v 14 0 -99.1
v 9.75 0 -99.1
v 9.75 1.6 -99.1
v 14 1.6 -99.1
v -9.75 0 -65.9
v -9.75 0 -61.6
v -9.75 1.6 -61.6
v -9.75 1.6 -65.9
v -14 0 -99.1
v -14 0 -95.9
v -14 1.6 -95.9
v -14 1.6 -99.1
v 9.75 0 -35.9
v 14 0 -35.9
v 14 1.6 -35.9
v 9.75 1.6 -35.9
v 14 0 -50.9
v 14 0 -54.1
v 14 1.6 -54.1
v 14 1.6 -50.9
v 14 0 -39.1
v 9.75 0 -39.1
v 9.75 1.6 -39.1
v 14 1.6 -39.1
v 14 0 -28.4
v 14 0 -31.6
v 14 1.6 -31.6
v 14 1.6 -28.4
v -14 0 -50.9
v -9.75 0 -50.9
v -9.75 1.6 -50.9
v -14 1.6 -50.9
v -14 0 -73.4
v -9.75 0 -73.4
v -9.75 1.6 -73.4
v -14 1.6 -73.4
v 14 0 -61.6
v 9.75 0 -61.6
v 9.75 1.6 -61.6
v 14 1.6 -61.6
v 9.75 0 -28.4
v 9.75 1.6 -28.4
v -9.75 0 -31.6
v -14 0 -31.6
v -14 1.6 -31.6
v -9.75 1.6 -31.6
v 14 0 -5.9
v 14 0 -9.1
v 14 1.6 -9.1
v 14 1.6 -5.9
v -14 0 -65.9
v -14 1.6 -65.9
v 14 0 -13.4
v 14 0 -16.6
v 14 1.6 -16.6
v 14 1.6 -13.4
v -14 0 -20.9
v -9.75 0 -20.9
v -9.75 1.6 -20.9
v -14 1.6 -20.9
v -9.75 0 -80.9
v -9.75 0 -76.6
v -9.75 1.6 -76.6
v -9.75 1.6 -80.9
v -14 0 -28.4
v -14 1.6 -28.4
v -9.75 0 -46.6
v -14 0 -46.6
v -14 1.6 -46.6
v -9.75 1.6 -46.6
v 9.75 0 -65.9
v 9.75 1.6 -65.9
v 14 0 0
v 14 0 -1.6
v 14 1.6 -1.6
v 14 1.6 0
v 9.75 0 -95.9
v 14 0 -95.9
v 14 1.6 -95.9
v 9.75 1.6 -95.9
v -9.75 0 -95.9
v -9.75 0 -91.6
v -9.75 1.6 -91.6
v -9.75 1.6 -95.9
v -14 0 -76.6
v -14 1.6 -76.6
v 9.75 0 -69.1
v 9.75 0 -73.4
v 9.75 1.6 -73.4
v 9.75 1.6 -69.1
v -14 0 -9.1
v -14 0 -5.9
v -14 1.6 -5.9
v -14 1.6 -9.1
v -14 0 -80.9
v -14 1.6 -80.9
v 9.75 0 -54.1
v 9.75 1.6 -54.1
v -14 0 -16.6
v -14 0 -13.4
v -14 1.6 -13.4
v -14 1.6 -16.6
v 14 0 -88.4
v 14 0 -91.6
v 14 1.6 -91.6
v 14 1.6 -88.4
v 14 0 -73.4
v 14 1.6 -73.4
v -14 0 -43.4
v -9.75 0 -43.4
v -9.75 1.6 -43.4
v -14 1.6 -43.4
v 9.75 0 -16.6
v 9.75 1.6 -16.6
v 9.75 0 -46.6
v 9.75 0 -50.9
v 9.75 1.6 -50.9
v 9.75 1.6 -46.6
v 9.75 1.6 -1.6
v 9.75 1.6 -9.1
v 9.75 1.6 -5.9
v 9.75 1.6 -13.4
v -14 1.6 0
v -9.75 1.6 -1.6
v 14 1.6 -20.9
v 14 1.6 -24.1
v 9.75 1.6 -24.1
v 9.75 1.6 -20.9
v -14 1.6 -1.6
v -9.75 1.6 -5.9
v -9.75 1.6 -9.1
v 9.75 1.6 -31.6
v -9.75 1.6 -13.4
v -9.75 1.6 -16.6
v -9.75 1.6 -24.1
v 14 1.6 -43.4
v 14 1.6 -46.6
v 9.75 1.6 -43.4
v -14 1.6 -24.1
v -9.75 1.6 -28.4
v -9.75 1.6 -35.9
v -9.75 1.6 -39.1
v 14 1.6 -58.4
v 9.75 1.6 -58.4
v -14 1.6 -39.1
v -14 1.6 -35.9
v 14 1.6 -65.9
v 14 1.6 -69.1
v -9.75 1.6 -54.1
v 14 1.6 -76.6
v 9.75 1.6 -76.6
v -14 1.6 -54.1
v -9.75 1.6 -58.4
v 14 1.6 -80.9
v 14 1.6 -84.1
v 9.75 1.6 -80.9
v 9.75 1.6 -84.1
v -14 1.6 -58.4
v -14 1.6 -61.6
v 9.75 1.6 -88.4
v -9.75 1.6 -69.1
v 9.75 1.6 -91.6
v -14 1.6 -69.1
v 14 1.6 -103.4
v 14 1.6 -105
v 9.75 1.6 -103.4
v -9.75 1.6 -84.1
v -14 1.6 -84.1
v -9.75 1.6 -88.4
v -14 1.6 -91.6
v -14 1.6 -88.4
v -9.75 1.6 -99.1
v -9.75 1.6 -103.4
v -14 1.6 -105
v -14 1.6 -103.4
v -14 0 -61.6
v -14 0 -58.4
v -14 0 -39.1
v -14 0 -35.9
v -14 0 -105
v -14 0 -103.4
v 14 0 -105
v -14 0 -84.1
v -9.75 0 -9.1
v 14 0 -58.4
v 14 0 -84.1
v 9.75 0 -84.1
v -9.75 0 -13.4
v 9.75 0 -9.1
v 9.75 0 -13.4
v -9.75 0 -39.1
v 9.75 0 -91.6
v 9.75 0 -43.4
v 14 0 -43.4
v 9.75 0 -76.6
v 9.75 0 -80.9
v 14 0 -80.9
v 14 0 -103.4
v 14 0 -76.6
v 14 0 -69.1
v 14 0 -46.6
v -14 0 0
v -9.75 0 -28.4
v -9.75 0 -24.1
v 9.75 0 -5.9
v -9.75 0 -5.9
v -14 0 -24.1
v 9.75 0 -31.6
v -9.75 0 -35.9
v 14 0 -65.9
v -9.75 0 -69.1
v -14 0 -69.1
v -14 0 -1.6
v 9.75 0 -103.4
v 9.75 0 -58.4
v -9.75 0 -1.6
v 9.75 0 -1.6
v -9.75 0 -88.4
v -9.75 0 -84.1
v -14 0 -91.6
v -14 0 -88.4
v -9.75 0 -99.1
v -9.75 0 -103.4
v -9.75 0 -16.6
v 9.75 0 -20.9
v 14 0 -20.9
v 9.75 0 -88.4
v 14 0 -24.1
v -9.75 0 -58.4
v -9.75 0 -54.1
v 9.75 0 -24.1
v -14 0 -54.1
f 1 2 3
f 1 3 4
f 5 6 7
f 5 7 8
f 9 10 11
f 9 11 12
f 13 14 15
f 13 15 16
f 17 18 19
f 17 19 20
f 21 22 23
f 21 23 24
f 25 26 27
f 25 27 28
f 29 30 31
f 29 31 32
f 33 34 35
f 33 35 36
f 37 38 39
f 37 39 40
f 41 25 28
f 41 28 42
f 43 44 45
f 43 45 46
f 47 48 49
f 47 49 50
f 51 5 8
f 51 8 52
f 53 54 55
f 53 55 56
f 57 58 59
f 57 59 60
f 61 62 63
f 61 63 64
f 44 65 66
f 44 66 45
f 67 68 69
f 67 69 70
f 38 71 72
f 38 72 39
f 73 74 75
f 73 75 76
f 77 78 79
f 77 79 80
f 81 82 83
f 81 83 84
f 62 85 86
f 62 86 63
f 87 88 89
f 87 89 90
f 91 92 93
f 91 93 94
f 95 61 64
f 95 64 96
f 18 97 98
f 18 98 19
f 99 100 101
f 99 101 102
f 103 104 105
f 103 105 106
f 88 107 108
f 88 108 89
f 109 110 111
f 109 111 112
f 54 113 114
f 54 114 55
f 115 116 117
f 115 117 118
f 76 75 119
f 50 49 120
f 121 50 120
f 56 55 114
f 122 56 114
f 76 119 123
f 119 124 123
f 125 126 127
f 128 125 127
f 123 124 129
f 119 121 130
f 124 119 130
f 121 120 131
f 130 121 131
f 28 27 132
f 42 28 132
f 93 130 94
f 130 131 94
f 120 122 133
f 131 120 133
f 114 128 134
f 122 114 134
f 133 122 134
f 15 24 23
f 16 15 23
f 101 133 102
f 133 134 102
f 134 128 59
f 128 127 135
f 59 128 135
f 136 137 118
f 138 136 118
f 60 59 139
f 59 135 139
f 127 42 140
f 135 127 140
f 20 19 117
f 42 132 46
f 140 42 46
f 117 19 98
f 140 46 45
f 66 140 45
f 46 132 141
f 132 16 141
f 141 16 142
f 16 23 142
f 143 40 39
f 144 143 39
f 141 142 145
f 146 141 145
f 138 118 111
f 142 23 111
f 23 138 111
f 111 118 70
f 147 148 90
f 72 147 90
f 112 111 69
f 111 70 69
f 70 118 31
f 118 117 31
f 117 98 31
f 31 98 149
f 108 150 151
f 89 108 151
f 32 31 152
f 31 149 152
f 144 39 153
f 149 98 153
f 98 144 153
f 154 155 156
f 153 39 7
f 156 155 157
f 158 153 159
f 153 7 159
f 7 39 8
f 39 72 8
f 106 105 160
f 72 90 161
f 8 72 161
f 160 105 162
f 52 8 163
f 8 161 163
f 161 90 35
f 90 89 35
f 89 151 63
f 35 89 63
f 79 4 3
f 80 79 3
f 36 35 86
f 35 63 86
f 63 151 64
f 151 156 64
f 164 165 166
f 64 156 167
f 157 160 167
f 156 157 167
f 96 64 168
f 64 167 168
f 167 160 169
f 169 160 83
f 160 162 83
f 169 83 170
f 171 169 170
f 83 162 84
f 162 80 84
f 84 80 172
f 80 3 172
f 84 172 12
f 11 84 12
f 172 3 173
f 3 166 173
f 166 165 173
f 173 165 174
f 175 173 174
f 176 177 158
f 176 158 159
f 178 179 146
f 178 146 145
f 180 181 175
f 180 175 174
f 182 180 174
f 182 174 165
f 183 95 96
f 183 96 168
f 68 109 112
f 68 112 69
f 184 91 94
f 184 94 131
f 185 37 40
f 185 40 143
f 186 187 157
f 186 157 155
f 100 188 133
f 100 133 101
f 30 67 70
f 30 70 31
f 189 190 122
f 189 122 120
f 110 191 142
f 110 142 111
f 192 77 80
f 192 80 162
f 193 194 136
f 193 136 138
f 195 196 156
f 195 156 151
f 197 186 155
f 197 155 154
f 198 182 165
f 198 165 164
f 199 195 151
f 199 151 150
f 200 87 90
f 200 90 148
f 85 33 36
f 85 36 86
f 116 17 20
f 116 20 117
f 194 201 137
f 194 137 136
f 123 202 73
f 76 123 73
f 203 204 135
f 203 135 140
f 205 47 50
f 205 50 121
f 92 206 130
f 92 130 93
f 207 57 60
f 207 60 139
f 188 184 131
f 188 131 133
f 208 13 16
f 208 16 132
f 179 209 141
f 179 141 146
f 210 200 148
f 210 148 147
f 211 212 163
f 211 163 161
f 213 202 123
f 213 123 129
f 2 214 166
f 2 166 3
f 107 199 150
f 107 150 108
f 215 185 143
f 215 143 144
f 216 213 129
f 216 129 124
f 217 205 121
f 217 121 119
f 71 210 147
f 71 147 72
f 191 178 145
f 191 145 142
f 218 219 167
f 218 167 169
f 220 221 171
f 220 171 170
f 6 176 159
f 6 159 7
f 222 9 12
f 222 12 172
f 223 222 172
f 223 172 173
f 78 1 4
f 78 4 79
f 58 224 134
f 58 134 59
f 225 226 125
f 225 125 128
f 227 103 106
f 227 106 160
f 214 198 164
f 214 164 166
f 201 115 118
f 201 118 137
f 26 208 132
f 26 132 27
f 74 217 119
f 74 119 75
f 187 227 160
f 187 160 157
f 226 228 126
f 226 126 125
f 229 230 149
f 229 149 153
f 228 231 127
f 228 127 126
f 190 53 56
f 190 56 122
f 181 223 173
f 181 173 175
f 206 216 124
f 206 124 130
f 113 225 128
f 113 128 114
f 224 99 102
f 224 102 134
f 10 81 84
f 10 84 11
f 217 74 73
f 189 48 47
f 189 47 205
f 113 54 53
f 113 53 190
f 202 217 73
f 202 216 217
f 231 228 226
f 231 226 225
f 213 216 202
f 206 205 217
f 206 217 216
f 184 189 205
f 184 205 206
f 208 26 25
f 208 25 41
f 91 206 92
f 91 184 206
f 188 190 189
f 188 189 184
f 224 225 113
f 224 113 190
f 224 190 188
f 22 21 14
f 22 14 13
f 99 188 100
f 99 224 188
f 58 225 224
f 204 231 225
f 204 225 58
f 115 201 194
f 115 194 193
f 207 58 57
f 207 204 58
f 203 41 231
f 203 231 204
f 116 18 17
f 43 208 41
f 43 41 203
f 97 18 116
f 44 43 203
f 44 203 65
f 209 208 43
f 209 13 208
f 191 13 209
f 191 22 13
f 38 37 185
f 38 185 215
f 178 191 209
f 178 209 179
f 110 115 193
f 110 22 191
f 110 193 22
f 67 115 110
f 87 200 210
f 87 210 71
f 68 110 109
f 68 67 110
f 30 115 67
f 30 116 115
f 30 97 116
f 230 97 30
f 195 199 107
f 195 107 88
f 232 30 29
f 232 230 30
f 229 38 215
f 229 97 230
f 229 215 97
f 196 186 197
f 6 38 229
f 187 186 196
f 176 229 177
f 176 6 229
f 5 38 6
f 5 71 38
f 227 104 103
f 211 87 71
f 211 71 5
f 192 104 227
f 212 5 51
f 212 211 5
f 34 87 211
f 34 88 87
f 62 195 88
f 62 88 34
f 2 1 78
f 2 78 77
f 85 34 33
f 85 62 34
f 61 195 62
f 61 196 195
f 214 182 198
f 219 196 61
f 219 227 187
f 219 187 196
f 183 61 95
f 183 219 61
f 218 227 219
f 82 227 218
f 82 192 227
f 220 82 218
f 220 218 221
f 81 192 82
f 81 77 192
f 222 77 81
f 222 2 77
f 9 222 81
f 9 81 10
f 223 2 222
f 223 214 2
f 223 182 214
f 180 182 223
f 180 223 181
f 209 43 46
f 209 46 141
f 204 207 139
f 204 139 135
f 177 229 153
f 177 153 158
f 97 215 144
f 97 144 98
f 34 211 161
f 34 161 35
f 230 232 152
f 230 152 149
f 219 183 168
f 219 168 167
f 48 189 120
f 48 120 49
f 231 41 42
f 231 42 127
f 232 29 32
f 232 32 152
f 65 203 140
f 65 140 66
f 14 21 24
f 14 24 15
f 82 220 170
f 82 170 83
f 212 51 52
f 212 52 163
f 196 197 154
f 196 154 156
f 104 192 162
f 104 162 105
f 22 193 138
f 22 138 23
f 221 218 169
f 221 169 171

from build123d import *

# Parameters (mm, degrees)
BOSS_EXTRUDE1_DEPTH     = 1.6
CUT_EXTRUDE1_DEPTH      = 108.527298859
CUT_EXTRUDE1_DEPTH_BACK = 108.527298859
SKETCH2_OUTSIDE_W       = 52.356
SKETCH2_OUTSIDE_H       = 132.556
SKETCH2_OUTSIDE_W_2     = 49.825582729
SKETCH2_OUTSIDE_H_2     = 105


with BuildPart() as part:
    # Sketch1 → Boss-Extrude1 (new body)
    with BuildSketch(Plane(origin=(0, 0, 0), x_dir=(1, 0, 0), z_dir=(0, 1, 0))):
        Polygon((14, -1.6), (-14, -1.6), (-14, 1.6), (-9.75, 1.6), (-9.75, 5.9), (-14, 5.9), (-14, 9.1), (-9.75, 9.1), (-9.75, 13.4), (-14, 13.4), (-14, 16.6), (-9.75, 16.6), (-9.75, 20.9), (-14, 20.9), (-14, 24.1), (-9.75, 24.1), (-9.75, 28.4), (-14, 28.4), (-14, 31.6), (-9.75, 31.6), (-9.75, 35.9), (-14, 35.9), (-14, 39.1), (-9.75, 39.1), (-9.75, 43.4), (-14, 43.4), (-14, 46.6), (-9.75, 46.6), (-9.75, 50.9), (-14, 50.9), (-14, 54.1), (-9.75, 54.1), (-9.75, 58.4), (-14, 58.4), (-14, 61.6), (-9.75, 61.6), (-9.75, 65.9), (-14, 65.9), (-14, 69.1), (-9.75, 69.1), (-9.75, 73.4), (-14, 73.4), (-14, 76.6), (-9.75, 76.6), (-9.75, 80.9), (-14, 80.9), (-14, 84.1), (-9.75, 84.1), (-9.75, 88.4), (-14, 88.4), (-14, 91.6), (-9.75, 91.6), (-9.75, 95.9), (-14, 95.9), (-14, 99.1), (-9.75, 99.1), (-9.75, 103.4), (-14, 103.4), (-14, 106.6), (14, 106.6), (14, 103.4), (9.75, 103.4), (9.75, 99.1), (14, 99.1), (14, 95.9), (9.75, 95.9), (9.75, 91.6), (14, 91.6), (14, 88.4), (9.75, 88.4), (9.75, 84.1), (14, 84.1), (14, 80.9), (9.75, 80.9), (9.75, 76.6), (14, 76.6), (14, 73.4), (9.75, 73.4), (9.75, 69.1), (14, 69.1), (14, 65.9), (9.75, 65.9), (9.75, 61.6), (14, 61.6), (14, 58.4), (9.75, 58.4), (9.75, 54.1), (14, 54.1), (14, 50.9), (9.75, 50.9), (9.75, 46.6), (14, 46.6), (14, 43.4), (9.75, 43.4), (9.75, 39.1), (14, 39.1), (14, 35.9), (9.75, 35.9), (9.75, 31.6), (14, 31.6), (14, 28.4), (9.75, 28.4), (9.75, 24.1), (14, 24.1), (14, 20.9), (9.75, 20.9), (9.75, 16.6), (14, 16.6), (14, 13.4), (9.75, 13.4), (9.75, 9.1), (14, 9.1), (14, 5.9), (9.75, 5.9), (9.75, 1.6), (14, 1.6), align=None)
    extrude(amount=BOSS_EXTRUDE1_DEPTH)

    # Sketch2 outside → Cut-Extrude1 (cut, two sides: drawn at the far end of the back side and taken through both)
    with BuildSketch(Plane(origin=(0, 1.6, 0), x_dir=(1, 0, 0), z_dir=(0, 1, 0)).offset(-CUT_EXTRUDE1_DEPTH_BACK)):
        with Locations((0, 52.5)):
            Rectangle(SKETCH2_OUTSIDE_W, SKETCH2_OUTSIDE_H)
        with Locations((0.983399659, 52.5)):
            Rectangle(SKETCH2_OUTSIDE_W_2, SKETCH2_OUTSIDE_H_2, mode=Mode.SUBTRACT)
    extrude(amount=CUT_EXTRUDE1_DEPTH + CUT_EXTRUDE1_DEPTH_BACK, mode=Mode.SUBTRACT)


solid = part.part
